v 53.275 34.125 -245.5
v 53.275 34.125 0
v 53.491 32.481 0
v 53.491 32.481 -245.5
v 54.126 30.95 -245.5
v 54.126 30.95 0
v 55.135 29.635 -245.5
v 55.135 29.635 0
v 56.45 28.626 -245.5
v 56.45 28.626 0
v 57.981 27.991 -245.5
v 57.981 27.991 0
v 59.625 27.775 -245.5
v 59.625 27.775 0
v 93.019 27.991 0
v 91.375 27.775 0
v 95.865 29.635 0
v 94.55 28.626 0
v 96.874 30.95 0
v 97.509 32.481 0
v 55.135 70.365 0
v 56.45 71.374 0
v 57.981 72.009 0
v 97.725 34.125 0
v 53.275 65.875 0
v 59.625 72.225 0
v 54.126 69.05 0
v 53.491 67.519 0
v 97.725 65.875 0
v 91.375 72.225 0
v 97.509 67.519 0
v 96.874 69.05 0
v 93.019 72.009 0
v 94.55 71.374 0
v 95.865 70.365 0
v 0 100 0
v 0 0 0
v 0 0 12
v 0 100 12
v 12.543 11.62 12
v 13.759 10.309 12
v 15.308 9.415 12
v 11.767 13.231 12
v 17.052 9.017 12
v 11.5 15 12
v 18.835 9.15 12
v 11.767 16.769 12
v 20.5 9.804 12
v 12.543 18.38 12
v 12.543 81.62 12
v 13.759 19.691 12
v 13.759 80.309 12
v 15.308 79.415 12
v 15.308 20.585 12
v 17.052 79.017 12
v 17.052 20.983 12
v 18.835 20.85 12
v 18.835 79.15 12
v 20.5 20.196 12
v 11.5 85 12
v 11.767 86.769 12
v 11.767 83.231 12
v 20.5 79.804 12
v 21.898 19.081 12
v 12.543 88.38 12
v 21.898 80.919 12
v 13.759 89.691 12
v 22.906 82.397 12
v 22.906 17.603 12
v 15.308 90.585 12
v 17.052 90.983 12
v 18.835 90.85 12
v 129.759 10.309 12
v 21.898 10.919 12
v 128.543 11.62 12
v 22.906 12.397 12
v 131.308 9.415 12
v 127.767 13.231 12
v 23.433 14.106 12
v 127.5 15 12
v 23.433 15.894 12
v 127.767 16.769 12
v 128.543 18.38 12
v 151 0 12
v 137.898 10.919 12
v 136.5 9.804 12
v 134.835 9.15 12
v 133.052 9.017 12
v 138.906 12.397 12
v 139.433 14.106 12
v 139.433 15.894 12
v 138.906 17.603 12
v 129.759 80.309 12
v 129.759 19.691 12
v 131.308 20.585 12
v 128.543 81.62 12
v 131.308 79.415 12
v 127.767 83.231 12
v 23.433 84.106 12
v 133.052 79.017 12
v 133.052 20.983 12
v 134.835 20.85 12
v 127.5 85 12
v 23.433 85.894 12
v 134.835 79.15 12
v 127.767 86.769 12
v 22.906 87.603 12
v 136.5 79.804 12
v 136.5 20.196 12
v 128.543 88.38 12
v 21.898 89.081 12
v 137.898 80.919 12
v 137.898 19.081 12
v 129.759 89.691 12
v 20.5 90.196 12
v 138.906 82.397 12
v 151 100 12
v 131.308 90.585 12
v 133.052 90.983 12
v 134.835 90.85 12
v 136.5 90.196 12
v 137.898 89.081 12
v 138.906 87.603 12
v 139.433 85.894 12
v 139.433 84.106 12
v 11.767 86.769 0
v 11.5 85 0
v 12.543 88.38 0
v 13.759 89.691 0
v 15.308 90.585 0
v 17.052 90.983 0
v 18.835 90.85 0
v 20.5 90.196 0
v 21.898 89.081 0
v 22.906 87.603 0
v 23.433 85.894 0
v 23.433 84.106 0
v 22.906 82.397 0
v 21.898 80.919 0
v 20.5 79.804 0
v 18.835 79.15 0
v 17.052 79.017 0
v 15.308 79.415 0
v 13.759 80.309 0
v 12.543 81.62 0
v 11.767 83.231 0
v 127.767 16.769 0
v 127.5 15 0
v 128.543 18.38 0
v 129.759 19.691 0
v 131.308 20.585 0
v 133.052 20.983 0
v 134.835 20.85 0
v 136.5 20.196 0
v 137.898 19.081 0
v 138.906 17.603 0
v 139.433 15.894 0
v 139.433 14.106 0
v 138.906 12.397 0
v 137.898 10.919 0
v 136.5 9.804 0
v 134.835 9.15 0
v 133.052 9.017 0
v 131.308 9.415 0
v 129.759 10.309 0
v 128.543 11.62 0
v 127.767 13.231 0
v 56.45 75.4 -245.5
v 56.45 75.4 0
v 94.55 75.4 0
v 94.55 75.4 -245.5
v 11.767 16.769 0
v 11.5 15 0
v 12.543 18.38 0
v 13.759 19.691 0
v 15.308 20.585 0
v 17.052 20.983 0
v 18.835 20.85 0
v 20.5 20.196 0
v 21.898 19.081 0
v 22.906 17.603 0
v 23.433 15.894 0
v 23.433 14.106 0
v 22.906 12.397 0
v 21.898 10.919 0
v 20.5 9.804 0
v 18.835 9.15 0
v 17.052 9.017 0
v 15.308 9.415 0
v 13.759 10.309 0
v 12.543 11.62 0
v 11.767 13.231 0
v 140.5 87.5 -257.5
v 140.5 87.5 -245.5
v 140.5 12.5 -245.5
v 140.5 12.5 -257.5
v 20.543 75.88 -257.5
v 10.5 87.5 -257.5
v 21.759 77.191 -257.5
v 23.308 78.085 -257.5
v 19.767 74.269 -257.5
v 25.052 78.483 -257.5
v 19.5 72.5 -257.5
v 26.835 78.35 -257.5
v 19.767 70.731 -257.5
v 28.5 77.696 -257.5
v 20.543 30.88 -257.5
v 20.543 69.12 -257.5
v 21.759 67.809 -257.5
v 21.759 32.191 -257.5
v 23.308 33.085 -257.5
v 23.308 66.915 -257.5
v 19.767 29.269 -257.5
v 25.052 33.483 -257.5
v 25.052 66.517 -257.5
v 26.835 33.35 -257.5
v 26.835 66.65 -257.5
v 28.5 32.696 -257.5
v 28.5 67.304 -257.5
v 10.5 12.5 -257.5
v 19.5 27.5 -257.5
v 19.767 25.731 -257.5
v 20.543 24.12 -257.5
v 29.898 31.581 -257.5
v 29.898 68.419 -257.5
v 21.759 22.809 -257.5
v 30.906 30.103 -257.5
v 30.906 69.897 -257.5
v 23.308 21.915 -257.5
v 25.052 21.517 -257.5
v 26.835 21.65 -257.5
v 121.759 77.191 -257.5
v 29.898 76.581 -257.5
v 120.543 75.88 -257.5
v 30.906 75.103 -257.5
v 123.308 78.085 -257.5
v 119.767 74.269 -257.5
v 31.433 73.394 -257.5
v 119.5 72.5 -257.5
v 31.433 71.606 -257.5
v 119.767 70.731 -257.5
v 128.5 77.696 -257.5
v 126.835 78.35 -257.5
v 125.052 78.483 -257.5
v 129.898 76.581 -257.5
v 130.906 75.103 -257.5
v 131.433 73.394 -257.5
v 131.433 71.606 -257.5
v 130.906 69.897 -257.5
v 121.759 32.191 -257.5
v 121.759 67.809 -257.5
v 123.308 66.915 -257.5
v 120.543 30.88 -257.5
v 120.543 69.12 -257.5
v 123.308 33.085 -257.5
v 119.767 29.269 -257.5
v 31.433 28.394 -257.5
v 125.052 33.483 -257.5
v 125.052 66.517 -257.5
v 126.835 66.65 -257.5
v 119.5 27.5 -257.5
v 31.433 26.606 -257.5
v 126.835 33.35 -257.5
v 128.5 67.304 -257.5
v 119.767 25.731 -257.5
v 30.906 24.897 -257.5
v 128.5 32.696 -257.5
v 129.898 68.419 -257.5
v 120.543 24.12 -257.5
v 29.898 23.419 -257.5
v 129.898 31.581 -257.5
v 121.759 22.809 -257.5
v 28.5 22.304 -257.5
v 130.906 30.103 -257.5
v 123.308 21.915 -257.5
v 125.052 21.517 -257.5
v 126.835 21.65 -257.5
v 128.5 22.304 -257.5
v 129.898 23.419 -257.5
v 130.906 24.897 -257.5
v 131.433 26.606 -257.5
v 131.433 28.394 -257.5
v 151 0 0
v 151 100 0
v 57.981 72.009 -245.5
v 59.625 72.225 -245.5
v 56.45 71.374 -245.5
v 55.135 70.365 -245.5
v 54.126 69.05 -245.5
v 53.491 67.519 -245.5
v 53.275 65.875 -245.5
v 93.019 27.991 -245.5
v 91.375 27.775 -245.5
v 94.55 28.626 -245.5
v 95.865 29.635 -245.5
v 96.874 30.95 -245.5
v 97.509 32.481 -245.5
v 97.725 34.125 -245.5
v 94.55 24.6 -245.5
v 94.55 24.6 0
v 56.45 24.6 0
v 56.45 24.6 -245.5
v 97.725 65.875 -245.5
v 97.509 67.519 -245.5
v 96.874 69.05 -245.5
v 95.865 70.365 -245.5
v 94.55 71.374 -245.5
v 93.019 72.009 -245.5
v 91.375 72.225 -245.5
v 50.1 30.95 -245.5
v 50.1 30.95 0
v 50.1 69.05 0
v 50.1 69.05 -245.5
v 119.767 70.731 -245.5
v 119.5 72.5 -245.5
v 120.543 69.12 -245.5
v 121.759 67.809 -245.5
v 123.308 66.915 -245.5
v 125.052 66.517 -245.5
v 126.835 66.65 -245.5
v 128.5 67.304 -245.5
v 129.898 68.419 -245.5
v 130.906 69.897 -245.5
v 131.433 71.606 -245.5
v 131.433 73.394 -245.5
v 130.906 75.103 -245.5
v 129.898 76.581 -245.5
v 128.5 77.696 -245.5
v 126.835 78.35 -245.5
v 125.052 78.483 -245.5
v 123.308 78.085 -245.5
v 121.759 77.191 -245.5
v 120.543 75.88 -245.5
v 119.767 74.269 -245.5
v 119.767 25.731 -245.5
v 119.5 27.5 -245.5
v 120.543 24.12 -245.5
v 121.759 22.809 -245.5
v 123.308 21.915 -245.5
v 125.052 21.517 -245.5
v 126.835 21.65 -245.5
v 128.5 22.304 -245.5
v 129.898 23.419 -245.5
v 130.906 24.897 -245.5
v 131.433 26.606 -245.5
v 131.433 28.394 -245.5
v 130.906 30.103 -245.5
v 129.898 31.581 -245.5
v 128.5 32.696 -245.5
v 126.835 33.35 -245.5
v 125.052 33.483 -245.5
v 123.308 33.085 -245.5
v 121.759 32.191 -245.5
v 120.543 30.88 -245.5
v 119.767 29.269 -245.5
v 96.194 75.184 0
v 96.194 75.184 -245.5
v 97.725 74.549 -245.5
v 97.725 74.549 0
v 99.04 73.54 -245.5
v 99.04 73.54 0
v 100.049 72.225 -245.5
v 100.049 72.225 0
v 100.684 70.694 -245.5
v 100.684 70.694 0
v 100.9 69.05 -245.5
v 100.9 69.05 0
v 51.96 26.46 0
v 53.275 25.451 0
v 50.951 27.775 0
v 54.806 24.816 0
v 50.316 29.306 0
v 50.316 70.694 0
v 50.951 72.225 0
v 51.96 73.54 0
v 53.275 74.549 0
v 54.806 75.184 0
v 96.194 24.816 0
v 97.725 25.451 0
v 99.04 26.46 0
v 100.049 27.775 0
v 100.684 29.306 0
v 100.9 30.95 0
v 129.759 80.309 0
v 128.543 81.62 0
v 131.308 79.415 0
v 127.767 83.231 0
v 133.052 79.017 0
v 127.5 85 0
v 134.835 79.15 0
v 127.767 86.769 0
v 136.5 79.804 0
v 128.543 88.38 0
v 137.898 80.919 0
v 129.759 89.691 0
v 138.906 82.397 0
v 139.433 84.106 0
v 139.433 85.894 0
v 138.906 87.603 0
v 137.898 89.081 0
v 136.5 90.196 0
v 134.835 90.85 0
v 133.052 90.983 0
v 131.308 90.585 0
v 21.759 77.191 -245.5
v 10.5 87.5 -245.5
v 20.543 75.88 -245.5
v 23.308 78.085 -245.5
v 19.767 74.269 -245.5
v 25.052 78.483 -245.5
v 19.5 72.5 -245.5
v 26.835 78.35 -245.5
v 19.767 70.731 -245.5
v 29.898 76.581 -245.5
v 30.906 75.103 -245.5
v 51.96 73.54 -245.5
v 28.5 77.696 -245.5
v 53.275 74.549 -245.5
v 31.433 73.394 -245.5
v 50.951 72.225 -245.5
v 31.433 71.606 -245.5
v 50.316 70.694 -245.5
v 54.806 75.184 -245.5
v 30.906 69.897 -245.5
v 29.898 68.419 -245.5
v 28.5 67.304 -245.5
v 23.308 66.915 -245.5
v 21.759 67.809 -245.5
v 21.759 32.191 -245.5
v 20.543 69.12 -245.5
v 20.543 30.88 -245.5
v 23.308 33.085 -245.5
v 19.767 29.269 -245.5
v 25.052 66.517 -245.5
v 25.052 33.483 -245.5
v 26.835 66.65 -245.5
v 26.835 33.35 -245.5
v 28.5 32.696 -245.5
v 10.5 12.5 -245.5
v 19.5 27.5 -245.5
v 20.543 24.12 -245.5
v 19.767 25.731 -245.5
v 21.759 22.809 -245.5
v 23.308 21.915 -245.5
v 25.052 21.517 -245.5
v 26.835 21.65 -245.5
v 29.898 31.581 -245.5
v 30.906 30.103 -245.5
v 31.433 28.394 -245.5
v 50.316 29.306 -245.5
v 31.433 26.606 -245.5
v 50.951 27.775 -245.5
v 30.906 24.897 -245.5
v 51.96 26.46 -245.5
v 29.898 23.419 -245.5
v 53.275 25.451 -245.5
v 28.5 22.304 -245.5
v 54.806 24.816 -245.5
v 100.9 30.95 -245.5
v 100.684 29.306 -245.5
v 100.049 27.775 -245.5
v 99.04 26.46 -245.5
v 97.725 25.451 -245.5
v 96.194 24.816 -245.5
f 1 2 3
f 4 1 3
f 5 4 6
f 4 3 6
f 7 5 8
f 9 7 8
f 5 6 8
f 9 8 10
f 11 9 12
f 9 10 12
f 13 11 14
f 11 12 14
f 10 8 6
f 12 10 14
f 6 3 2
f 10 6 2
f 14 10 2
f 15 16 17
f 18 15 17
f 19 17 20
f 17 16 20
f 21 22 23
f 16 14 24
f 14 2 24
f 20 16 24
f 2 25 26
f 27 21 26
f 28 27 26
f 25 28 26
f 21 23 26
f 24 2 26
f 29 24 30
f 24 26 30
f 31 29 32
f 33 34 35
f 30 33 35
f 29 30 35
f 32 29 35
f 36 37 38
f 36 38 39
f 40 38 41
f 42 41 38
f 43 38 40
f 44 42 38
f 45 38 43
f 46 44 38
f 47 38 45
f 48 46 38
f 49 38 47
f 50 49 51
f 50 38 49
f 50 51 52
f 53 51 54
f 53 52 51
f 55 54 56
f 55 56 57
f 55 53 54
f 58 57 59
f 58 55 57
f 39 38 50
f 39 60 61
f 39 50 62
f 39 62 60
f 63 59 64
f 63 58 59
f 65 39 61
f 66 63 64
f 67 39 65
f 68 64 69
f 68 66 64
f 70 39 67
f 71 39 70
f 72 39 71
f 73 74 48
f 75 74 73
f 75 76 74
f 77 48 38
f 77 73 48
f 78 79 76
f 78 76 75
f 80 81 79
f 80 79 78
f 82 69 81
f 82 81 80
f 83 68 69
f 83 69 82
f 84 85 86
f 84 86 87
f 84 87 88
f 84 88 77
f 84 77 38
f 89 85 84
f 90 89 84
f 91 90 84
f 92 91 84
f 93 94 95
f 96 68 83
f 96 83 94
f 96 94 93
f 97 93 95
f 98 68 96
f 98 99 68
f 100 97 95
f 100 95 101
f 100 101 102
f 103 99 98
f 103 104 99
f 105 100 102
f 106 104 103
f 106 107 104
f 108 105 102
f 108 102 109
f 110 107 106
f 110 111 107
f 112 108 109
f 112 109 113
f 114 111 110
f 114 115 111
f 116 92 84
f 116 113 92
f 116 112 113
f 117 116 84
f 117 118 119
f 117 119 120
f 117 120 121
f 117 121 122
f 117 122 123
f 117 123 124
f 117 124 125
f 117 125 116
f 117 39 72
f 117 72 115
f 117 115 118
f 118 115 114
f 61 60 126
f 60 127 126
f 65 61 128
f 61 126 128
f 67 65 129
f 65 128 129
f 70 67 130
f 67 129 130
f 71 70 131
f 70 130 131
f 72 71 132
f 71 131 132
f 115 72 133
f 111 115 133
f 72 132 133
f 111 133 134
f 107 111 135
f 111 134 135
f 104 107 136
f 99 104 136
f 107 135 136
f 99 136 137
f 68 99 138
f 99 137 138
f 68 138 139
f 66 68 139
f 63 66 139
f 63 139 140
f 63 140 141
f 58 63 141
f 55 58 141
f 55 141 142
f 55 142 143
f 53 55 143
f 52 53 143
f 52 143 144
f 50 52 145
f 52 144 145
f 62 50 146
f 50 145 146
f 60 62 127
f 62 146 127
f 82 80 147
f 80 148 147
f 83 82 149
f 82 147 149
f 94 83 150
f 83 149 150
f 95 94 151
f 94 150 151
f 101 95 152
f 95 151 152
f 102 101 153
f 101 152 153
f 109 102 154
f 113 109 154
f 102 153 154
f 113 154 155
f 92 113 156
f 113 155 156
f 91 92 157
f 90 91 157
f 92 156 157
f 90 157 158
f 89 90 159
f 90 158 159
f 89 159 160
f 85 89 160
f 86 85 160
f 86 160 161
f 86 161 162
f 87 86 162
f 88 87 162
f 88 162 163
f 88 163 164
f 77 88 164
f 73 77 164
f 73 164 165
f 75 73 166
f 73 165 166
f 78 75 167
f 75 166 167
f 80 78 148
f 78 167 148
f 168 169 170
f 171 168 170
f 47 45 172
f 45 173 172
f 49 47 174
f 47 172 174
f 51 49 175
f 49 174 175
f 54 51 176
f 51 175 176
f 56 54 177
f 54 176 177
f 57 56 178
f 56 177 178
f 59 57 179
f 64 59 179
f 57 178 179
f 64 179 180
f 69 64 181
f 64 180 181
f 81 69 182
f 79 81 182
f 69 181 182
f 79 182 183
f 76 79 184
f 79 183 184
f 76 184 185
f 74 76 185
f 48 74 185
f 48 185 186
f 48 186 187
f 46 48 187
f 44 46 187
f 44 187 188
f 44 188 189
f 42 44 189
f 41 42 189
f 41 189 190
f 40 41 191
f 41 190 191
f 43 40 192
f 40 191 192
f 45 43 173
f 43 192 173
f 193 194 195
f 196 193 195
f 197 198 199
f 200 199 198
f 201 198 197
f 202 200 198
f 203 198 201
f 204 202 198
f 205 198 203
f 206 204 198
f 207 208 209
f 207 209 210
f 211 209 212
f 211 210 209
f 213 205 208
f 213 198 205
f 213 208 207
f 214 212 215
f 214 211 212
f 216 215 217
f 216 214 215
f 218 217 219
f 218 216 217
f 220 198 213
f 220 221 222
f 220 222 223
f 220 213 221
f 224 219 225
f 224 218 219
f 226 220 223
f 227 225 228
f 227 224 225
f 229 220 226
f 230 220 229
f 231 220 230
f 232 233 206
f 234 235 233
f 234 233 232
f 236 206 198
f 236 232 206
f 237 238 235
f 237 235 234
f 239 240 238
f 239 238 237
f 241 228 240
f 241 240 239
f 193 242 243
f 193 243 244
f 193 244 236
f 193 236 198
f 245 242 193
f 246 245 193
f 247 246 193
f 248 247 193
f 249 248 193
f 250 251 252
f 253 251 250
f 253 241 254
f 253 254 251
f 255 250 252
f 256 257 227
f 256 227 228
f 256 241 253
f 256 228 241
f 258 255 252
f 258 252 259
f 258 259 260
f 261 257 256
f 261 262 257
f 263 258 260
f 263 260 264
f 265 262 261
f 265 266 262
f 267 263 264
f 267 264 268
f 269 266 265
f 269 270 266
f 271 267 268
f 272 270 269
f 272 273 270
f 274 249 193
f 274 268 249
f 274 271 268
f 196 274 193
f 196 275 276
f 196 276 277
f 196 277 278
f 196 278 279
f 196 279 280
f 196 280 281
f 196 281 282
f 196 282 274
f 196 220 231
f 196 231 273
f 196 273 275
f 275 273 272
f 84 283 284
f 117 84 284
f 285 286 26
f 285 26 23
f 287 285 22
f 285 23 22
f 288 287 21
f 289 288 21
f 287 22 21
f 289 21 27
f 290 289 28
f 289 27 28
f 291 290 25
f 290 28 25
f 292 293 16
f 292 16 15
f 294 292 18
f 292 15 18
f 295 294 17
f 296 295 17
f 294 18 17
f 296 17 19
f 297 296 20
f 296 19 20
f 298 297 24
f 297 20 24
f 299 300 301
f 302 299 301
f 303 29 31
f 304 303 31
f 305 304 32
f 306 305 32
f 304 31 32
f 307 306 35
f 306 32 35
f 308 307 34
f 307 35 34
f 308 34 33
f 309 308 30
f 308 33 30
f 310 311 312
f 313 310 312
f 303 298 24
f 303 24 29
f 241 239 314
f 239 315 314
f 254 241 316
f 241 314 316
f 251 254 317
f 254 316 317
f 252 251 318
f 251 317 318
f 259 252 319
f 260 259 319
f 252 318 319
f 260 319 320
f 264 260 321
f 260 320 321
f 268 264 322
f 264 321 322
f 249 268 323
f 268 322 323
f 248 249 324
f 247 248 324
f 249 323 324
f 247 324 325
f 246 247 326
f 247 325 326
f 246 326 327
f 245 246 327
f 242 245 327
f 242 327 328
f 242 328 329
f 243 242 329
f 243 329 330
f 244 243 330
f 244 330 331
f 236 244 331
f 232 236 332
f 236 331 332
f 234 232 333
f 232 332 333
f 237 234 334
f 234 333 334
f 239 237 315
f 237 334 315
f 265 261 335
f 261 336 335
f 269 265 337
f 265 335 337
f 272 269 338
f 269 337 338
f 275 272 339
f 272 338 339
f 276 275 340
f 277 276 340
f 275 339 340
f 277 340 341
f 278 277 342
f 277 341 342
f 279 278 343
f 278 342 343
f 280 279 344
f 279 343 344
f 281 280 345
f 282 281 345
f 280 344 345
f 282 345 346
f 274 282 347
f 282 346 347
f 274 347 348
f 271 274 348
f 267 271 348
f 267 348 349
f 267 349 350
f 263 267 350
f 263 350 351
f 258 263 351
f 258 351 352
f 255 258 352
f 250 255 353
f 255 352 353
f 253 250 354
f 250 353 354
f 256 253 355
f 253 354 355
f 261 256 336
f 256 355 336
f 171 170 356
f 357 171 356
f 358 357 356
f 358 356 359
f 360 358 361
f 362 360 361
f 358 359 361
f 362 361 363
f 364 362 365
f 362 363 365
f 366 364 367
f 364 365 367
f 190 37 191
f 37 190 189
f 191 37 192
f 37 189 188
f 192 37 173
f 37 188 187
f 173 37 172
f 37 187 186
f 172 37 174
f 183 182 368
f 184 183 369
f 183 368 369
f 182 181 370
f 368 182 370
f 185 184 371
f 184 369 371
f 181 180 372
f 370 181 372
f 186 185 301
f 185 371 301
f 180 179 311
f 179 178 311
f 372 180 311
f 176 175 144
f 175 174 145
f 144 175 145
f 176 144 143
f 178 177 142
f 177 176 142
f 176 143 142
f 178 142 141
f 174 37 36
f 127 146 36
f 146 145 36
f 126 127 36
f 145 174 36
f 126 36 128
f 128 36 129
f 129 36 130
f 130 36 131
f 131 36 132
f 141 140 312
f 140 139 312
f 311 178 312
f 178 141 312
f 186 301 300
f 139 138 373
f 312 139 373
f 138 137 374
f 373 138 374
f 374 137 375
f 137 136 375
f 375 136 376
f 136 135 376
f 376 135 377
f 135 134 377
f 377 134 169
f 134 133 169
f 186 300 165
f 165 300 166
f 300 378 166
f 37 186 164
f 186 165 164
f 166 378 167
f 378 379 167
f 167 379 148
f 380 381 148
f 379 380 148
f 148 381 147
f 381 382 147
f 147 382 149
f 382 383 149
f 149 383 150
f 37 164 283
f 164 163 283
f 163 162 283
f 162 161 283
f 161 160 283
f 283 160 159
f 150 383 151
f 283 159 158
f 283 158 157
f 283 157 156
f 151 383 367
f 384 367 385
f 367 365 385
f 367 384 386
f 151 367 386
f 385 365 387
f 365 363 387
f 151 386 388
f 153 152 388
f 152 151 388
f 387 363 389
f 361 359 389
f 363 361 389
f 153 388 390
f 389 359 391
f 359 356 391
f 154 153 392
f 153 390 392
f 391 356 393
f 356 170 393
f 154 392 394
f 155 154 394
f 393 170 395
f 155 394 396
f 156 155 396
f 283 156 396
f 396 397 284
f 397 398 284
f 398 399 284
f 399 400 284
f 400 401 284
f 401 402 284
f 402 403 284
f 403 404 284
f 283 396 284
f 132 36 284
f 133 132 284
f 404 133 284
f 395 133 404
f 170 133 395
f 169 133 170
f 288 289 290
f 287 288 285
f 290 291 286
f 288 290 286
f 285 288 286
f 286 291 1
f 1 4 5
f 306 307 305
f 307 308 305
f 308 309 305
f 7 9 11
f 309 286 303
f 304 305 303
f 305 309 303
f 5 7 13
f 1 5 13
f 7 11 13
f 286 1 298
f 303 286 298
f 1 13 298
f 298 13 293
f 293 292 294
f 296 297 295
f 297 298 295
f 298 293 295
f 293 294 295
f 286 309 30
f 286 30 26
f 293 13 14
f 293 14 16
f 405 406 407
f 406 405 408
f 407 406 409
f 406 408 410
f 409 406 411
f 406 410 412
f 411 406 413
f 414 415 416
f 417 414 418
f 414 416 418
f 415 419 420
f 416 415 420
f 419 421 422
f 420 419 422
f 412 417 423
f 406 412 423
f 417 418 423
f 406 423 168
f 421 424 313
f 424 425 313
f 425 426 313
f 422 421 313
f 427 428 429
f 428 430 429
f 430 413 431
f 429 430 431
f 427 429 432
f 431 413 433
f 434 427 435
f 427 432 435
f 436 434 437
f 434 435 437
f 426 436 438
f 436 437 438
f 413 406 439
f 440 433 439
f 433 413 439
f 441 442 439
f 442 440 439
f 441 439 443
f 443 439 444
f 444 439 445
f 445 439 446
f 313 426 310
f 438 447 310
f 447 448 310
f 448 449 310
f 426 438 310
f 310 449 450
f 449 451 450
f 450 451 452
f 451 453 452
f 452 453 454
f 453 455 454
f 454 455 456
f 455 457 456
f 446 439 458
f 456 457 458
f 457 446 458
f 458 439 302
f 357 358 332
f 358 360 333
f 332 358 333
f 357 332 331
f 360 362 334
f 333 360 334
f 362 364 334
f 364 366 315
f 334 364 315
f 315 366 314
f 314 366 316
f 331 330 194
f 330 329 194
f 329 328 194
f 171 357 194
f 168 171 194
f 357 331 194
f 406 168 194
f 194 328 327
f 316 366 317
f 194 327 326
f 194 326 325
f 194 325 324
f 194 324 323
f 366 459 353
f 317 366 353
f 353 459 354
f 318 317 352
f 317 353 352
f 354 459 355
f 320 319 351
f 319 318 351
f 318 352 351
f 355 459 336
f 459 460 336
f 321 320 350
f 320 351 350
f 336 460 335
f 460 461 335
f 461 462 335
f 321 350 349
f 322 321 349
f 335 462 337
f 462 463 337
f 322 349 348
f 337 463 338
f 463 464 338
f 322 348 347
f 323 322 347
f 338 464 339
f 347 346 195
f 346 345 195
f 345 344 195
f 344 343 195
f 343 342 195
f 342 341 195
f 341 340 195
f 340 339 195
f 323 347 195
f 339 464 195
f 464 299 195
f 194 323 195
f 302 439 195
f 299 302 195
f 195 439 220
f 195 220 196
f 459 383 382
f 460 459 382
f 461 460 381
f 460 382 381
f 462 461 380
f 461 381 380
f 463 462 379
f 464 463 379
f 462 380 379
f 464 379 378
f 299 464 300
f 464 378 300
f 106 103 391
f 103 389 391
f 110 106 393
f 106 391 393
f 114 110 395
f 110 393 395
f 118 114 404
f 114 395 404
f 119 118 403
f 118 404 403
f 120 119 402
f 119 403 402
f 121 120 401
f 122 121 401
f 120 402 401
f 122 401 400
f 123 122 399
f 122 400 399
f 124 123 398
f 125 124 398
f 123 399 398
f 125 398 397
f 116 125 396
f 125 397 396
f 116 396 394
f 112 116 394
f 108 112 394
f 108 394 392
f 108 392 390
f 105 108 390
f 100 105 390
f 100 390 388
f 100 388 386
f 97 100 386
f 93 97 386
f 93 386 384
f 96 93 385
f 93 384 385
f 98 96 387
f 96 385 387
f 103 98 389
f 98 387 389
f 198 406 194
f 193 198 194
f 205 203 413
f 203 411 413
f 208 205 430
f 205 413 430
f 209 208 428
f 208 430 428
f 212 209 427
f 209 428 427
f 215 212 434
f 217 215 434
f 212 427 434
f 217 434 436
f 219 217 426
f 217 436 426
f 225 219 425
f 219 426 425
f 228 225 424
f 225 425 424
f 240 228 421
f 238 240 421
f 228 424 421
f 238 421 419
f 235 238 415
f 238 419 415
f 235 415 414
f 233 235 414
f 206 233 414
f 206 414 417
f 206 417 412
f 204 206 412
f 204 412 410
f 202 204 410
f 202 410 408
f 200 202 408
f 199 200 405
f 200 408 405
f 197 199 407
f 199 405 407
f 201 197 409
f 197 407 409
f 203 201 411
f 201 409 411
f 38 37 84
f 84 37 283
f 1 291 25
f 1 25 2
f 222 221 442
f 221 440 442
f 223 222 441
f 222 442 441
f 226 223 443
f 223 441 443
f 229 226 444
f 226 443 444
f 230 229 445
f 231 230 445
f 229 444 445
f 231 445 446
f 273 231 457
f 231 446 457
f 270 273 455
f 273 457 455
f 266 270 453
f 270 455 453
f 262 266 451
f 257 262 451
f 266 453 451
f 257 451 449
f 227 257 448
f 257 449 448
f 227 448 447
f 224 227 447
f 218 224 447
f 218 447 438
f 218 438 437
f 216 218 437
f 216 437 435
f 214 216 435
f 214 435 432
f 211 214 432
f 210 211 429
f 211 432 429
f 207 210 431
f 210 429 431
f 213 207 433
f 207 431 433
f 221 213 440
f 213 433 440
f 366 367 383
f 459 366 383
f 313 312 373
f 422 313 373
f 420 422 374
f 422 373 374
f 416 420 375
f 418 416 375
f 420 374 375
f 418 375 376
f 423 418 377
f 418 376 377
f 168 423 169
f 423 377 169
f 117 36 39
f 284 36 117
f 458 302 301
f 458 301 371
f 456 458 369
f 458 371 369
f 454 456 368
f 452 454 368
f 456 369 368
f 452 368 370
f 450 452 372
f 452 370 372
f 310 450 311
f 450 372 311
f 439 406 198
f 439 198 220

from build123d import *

# Parameters (mm, degrees)
F0_W     = 151
F0_H     = 100
F1_DEPTH = 12
F3_DEPTH = 245.5
F5_D     = 12
F5_DEPTH = 12
F5_TIP   = 3.6051637142
F6_W     = 130
F6_H     = 75
F7_DEPTH = 12
F9_D     = 12
F9_DEPTH = 12
F9_TIP   = 3.6051637142


with BuildPart() as f1:
    # F0 (on Top) → F1 (new body)
    with BuildSketch(Plane.XY):
        with Locations((75.5, 50)):
            Rectangle(F0_W, F0_H)
    extrude(amount=F1_DEPTH)

    # F2 (on face) → F3 (join)
    with BuildSketch(Plane(origin=(0, 0, 0), x_dir=(1, 0, 0), z_dir=(0, 0, -1))):
        with BuildLine():
            ThreePointArc((100.9, -30.95), (99.0401280605, -26.4598719395), (94.55, -24.6))
            Line((94.55, -24.6), (56.45, -24.6))
            ThreePointArc((56.45, -24.6), (51.9598719395, -26.4598719395), (50.1, -30.95))
            Line((50.1, -30.95), (50.1, -69.05))
            ThreePointArc((50.1, -69.05), (51.9598719395, -73.5401280605), (56.45, -75.4))
            Line((56.45, -75.4), (94.55, -75.4))
            ThreePointArc((94.55, -75.4), (99.0401280605, -73.5401280605), (100.9, -69.05))
            Line((100.9, -69.05), (100.9, -30.95))
        make_face()
        with BuildLine():
            Line((59.625, -27.775), (91.375, -27.775))
            ThreePointArc((91.375, -27.775), (95.8651280605, -29.6348719395), (97.725, -34.125))
            Line((97.725, -34.125), (97.725, -65.875))
            ThreePointArc((97.725, -65.875), (95.8651280605, -70.3651280605), (91.375, -72.225))
            Line((91.375, -72.225), (59.625, -72.225))
            ThreePointArc((59.625, -72.225), (55.1348719395, -70.3651280605), (53.275, -65.875))
            Line((53.275, -65.875), (53.275, -34.125))
            ThreePointArc((53.275, -34.125), (55.1348719395, -29.6348719395), (59.625, -27.775))
        make_face(mode=Mode.SUBTRACT)
    extrude(amount=F3_DEPTH)

    # F5
    with Locations(Plane.XY.offset(12)):
        with Locations((17.5, 85), (133.5, 85), (133.5, 15), (17.5, 15)):
            Hole(F5_D / 2, depth=F5_DEPTH)
            with Locations((0, 0, -(F5_DEPTH + F5_TIP / 2))):  # 118° drill point
                Cone(0, F5_D / 2, F5_TIP, mode=Mode.SUBTRACT)

    # F6 (on face) → F7 (join)
    with BuildSketch(Plane(origin=(0, 0, -245.5), x_dir=(1, 0, 0), z_dir=(0, 0, -1))):
        with Locations((75.5, -50)):
            Rectangle(F6_W, F6_H)
        with BuildLine():
            ThreePointArc((94.55, -24.6), (99.0401280605, -26.4598719395), (100.9, -30.95))
            Line((100.9, -30.95), (100.9, -69.05))
            ThreePointArc((100.9, -69.05), (99.0401280605, -73.5401280605), (94.55, -75.4))
            Line((94.55, -75.4), (56.45, -75.4))
            ThreePointArc((56.45, -75.4), (51.9598719395, -73.5401280605), (50.1, -69.05))
            Line((50.1, -69.05), (50.1, -30.95))
            ThreePointArc((50.1, -30.95), (51.9598719395, -26.4598719395), (56.45, -24.6))
            Line((56.45, -24.6), (94.55, -24.6))
        make_face(mode=Mode.SUBTRACT)
        with BuildLine():
            Line((100.9, -69.05), (100.9, -30.95))
            ThreePointArc((100.9, -30.95), (99.0401280605, -26.4598719395), (94.55, -24.6))
            Line((94.55, -24.6), (56.45, -24.6))
            ThreePointArc((56.45, -24.6), (51.9598719395, -26.4598719395), (50.1, -30.95))
            Line((50.1, -30.95), (50.1, -69.05))
            ThreePointArc((50.1, -69.05), (51.9598719395, -73.5401280605), (56.45, -75.4))
            Line((56.45, -75.4), (94.55, -75.4))
            ThreePointArc((94.55, -75.4), (99.0401280605, -73.5401280605), (100.9, -69.05))
        make_face()
        with BuildLine():
            Line((53.275, -65.875), (53.275, -34.125))
            ThreePointArc((53.275, -34.125), (55.1348719395, -29.6348719395), (59.625, -27.775))
            Line((59.625, -27.775), (91.375, -27.775))
            ThreePointArc((91.375, -27.775), (95.8651280605, -29.6348719395), (97.725, -34.125))
            Line((97.725, -34.125), (97.725, -65.875))
            ThreePointArc((97.725, -65.875), (95.8651280605, -70.3651280605), (91.375, -72.225))
            Line((91.375, -72.225), (59.625, -72.225))
            ThreePointArc((59.625, -72.225), (55.1348719395, -70.3651280605), (53.275, -65.875))
        make_face(mode=Mode.SUBTRACT)
        with BuildLine():
            ThreePointArc((59.625, -27.775), (55.1348719395, -29.6348719395), (53.275, -34.125))
            Line((53.275, -34.125), (53.275, -65.875))
            ThreePointArc((53.275, -65.875), (55.1348719395, -70.3651280605), (59.625, -72.225))
            Line((59.625, -72.225), (91.375, -72.225))
            ThreePointArc((91.375, -72.225), (95.8651280605, -70.3651280605), (97.725, -65.875))
            Line((97.725, -65.875), (97.725, -34.125))
            ThreePointArc((97.725, -34.125), (95.8651280605, -29.6348719395), (91.375, -27.775))
            Line((91.375, -27.775), (59.625, -27.775))
        make_face()
    extrude(amount=F7_DEPTH)

    # F9
    with Locations(Plane(origin=(0, 0, -257.5), x_dir=(1, 0, 0), z_dir=(0, 0, -1))):
        with Locations((25.5, -27.5), (25.5, -72.5), (125.5, -72.5), (125.5, -27.5)):
            Hole(F9_D / 2, depth=F9_DEPTH)
            with Locations((0, 0, -(F9_DEPTH + F9_TIP / 2))):  # 118° drill point
                Cone(0, F9_D / 2, F9_TIP, mode=Mode.SUBTRACT)


solid = f1.part
